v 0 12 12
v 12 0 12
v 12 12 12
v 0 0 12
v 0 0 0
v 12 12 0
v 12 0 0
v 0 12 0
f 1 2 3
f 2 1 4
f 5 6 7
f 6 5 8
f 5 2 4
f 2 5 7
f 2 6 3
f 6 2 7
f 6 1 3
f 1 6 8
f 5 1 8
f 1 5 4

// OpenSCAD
// Construct: let() introducing local bindings inside an expression.
size = let (a = 4, b = a * 2) a + b;
cube(size);
